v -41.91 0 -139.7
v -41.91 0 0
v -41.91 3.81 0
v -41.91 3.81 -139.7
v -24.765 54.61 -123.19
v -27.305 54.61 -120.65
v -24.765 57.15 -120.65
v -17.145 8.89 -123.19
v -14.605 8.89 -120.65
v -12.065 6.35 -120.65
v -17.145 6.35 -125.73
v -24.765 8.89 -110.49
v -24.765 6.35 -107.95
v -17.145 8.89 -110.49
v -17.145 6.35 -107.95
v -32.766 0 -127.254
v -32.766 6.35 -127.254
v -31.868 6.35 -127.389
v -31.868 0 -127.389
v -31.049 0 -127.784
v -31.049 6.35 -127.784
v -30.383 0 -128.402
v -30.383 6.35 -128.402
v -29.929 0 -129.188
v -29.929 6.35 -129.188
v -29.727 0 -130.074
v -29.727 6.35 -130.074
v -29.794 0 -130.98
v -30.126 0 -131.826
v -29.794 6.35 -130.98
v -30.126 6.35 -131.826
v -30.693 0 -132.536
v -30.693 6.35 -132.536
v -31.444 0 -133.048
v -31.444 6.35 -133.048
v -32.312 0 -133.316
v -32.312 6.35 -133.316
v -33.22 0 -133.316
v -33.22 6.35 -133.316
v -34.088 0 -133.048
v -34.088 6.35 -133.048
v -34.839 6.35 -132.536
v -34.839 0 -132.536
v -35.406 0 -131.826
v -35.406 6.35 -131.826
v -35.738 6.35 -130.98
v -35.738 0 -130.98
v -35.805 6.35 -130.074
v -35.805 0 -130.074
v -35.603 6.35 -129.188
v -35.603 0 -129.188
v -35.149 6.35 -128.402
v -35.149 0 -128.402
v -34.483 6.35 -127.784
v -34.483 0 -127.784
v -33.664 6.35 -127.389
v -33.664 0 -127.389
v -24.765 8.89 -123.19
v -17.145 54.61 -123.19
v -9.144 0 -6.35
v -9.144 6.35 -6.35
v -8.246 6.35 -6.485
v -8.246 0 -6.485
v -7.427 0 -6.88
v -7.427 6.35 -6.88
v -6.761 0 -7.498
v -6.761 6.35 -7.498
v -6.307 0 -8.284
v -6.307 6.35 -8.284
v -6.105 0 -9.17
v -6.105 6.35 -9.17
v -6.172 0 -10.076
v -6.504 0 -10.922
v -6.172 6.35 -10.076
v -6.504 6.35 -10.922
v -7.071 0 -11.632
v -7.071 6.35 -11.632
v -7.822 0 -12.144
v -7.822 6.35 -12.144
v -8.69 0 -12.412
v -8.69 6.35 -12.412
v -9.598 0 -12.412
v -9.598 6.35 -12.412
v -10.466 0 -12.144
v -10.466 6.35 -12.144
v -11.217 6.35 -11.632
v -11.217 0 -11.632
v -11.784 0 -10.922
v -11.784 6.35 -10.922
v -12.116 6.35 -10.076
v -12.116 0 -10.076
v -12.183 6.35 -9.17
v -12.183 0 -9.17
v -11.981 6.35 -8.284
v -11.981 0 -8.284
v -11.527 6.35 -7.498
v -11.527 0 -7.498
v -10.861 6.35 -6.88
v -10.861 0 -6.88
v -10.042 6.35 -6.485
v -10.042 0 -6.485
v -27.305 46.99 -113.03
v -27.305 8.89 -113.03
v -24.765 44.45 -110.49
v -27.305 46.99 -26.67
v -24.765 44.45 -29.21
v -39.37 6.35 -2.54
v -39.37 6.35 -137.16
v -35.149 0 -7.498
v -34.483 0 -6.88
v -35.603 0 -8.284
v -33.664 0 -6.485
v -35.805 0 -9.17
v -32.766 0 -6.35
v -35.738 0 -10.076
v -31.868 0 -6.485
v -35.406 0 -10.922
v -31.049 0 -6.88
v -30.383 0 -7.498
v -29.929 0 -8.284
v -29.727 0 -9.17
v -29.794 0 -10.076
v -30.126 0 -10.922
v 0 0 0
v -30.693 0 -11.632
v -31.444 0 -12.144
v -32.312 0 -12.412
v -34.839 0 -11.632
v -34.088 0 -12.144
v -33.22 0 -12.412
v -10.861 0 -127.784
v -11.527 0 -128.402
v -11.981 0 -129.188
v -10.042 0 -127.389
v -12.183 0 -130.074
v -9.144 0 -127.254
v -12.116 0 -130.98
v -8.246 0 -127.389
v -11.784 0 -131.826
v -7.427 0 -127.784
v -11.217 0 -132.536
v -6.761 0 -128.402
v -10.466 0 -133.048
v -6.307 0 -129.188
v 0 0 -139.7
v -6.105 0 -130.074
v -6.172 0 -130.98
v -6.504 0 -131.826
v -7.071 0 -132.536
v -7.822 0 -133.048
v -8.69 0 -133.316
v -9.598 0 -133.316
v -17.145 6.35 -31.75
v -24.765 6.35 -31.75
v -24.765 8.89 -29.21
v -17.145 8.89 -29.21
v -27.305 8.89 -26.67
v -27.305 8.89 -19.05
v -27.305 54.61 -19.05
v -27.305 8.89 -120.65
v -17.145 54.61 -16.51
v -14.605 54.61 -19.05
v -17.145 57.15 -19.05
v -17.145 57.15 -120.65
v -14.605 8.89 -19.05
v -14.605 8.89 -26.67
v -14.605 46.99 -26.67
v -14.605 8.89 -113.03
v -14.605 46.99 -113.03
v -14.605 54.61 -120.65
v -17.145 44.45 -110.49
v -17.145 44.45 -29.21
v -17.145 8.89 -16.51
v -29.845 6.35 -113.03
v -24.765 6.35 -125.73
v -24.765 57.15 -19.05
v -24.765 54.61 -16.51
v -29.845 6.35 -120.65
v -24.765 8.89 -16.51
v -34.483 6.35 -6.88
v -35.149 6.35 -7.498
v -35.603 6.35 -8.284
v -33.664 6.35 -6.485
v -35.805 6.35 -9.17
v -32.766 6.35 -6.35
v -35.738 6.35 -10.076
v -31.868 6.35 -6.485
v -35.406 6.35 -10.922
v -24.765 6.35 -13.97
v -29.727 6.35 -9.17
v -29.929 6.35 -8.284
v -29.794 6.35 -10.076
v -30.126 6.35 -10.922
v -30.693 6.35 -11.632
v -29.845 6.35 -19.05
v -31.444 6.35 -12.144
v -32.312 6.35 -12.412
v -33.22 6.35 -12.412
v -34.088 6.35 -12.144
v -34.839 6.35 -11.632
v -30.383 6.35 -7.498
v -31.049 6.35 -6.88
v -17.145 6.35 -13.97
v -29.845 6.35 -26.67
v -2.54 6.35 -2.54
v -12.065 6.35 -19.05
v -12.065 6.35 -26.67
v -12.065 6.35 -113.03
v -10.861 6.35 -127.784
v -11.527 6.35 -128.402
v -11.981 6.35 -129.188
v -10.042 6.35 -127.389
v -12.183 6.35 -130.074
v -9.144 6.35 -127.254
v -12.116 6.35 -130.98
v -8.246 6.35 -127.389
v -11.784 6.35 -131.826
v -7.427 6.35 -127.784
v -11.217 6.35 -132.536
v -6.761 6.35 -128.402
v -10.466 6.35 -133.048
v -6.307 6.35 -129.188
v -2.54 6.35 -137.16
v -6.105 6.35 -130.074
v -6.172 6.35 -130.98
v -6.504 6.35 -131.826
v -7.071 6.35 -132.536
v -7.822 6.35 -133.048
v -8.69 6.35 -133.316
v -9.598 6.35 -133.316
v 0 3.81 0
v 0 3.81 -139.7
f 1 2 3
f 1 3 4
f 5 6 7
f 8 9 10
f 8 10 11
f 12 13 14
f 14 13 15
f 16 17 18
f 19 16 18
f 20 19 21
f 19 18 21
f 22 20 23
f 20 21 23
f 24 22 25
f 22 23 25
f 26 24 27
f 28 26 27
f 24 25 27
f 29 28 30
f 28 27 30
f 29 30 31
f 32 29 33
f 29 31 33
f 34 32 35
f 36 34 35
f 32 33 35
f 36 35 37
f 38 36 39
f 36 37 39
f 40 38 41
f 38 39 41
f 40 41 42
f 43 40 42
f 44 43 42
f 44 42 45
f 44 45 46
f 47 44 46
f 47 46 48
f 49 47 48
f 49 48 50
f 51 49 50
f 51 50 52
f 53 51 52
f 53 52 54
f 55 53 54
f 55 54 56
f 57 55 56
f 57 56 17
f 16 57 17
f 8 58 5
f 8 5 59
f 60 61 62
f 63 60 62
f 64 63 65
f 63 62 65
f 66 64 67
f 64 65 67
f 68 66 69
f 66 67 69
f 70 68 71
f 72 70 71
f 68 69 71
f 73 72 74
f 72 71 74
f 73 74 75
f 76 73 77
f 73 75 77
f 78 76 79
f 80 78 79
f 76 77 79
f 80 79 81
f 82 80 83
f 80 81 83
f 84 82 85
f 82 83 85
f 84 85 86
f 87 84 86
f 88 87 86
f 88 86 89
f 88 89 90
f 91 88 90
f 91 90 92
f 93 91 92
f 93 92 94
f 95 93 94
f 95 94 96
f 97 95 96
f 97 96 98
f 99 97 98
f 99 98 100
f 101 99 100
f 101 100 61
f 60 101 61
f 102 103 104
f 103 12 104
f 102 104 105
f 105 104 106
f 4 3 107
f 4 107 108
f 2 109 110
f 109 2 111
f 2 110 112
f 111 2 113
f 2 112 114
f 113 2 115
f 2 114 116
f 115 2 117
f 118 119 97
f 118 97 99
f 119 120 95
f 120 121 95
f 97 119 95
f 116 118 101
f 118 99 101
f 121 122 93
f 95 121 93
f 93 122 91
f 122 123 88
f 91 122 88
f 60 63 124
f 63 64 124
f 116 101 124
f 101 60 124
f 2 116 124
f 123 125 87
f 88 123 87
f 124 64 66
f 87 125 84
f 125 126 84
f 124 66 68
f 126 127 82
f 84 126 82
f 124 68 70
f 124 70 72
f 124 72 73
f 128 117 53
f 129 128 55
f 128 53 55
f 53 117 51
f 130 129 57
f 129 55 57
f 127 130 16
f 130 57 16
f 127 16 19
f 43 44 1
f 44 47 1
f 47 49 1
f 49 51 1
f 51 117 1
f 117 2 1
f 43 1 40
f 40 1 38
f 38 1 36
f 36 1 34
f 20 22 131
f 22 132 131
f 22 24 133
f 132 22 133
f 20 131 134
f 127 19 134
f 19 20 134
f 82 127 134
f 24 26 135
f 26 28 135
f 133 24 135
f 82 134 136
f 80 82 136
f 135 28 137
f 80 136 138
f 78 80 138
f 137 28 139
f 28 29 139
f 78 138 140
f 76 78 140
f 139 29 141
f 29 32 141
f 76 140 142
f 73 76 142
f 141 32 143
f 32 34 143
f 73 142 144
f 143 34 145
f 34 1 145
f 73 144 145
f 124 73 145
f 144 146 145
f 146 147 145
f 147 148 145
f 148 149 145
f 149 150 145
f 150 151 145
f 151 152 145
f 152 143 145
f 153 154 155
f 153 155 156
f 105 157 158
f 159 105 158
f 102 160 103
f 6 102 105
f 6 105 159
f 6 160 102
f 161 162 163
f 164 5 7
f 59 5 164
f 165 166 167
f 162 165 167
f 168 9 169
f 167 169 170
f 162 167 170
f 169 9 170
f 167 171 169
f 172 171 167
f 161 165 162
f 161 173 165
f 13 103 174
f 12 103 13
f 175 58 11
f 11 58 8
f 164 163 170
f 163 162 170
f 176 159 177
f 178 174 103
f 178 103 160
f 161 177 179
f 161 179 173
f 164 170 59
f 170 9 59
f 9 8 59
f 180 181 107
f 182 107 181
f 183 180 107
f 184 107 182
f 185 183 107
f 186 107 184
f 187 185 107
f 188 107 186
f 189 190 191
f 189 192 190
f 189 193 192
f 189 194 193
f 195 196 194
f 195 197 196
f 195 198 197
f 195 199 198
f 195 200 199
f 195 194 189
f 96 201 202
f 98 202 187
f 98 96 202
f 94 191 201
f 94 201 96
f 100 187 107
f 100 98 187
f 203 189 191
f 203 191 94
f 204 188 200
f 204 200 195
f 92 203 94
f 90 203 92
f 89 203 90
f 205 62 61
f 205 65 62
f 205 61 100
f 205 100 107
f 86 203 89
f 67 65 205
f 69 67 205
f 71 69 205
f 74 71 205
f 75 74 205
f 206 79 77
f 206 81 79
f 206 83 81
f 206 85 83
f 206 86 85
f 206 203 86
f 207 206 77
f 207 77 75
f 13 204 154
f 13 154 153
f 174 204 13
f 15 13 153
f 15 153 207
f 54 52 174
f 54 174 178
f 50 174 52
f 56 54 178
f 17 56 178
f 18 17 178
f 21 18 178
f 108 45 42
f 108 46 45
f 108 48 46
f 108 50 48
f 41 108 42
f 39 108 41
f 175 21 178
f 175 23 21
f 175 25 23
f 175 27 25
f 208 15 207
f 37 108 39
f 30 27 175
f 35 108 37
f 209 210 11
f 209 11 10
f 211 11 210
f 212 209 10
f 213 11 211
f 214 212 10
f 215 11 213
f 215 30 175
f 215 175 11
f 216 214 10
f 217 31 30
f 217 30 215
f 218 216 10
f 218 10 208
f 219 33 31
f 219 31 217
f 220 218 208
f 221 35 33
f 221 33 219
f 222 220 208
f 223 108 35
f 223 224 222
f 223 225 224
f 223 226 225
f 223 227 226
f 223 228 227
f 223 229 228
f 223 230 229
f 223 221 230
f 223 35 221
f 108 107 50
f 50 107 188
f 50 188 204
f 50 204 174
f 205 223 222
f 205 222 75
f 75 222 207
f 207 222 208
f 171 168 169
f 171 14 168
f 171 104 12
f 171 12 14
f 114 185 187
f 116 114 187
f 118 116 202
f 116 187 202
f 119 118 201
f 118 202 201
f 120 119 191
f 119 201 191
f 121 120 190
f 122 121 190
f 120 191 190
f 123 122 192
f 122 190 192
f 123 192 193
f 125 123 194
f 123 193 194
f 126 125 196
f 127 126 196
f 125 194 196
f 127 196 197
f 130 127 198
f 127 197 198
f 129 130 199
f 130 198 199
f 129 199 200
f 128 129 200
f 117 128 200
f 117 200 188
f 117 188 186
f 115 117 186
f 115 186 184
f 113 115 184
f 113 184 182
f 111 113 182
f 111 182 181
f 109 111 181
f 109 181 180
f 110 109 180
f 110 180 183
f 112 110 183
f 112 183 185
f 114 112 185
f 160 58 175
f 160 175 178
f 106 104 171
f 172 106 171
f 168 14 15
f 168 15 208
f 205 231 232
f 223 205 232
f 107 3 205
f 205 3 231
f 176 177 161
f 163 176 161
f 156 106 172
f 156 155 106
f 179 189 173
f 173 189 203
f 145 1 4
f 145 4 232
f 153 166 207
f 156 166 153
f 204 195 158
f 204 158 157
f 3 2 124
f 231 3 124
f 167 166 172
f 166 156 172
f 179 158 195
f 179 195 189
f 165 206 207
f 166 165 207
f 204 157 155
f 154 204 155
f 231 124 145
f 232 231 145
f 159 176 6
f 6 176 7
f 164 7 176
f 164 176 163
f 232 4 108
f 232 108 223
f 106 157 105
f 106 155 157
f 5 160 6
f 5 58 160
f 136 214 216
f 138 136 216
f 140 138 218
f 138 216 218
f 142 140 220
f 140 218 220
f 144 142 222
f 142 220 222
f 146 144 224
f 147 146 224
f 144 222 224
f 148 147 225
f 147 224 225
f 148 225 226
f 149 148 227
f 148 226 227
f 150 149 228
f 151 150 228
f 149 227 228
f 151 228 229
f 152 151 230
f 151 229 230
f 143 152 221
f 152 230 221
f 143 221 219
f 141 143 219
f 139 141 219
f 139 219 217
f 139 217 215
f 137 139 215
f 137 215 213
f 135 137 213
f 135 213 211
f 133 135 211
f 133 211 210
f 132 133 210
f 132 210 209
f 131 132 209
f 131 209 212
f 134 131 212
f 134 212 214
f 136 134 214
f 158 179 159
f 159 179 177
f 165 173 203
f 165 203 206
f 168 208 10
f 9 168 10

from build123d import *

# Parameters (mm, degrees)
SKETCH1_W           = 41.91
SKETCH1_H           = 139.7
BOSS_EXTRUDE1_DEPTH = 6.35
SKETCH2_R           = 3.048
CUT_EXTRUDE1_DEPTH  = 146.989248234
SKETCH3_W           = 12.7
SKETCH3_H           = 12.7
BOSS_EXTRUDE2_DEPTH = 50.8
BOSS_EXTRUDE3_REACH = 133.265
SKETCH4_W           = 12.7
SKETCH4_H           = 12.7
CHAMFER1_SIZE       = 2.54


with BuildPart() as part:
    # Sketch1 → Boss-Extrude1 (new body)
    with BuildSketch(Plane(origin=(0, 0, 0), x_dir=(1, 0, 0), z_dir=(0, 1, 0))):
        with Locations((-20.955, 69.85)):
            Rectangle(SKETCH1_W, SKETCH1_H)
    extrude(amount=BOSS_EXTRUDE1_DEPTH)

    # Sketch2 → Cut-Extrude1 (cut, through all)
    with BuildSketch(Plane(origin=(0, 6.35, 0), x_dir=(1, 0, 0), z_dir=(0, 1, 0))):
        with Locations(Location((-32.766, 130.302, 0), (0, 0, 270))):
            Circle(SKETCH2_R)
        with Locations(Location((-9.144, 130.302, 0), (0, 0, 270))):
            Circle(SKETCH2_R)
        with Locations(Location((-9.144, 9.398, 0), (0, 0, 270))):
            Circle(SKETCH2_R)
        with Locations(Location((-32.766, 9.398, 0), (0, 0, 270))):
            Circle(SKETCH2_R)
    extrude(amount=-CUT_EXTRUDE1_DEPTH, mode=Mode.SUBTRACT)

    # Sketch3 → Boss-Extrude2 (add)
    with BuildSketch(Plane(origin=(0, 6.35, 0), x_dir=(1, 0, 0), z_dir=(0, 1, 0))):
        with Locations((-20.955, 116.84)):
            Rectangle(SKETCH3_W, SKETCH3_H)
        with Locations((-20.955, 22.86)):
            Rectangle(SKETCH3_W, SKETCH3_H)
    extrude(amount=BOSS_EXTRUDE2_DEPTH)

    # Sketch4 → Boss-Extrude3 (add, up to next)
    with BuildSketch(Plane.XY.offset(-110.49), mode=Mode.PRIVATE) as boss_extrude3_sk1:
        with Locations((-20.955, 50.8)):
            Rectangle(SKETCH4_W, SKETCH4_H)
    boss_extrude3_tool1 = extrude(boss_extrude3_sk1.sketch, amount=BOSS_EXTRUDE3_REACH, mode=Mode.PRIVATE) - part.part
    add(boss_extrude3_tool1.solids().sort_by_distance((-20.955, 50.8, -110.49))[0])

    # Chamfer1
    chamfer1_edges = [part.edges().sort_by_distance(p)[0] for p in [
        (-41.91, 6.35, -69.85),
        (-20.955, 6.35, 0),
        (-27.305, 6.35, -116.84),
        (-27.305, 31.75, -123.19),
        (-20.955, 6.35, -110.49),
        (-14.605, 6.35, -116.84),
        (-20.955, 6.35, -123.19),
        (-14.605, 31.75, -123.19),
        (-27.305, 57.15, -69.85),
        (-14.605, 57.15, -69.85),
        (-20.955, 57.15, -123.19),
        (-27.305, 6.35, -22.86),
        (-20.955, 6.35, -16.51),
        (-27.305, 31.75, -16.51),
        (-14.605, 6.35, -22.86),
        (-14.605, 31.75, -16.51),
        (-20.955, 6.35, -29.21),
        (-20.955, 57.15, -16.51),
        (0, 6.35, -69.85),
        (-14.605, 25.4, -29.21),
        (-14.605, 25.4, -110.49),
        (-27.305, 25.4, -110.49),
        (-27.305, 25.4, -29.21),
        (-27.305, 44.45, -69.85),
        (-14.605, 44.45, -69.85),
        (-20.955, 6.35, -139.7),
    ]]
    chamfer(chamfer1_edges, length=CHAMFER1_SIZE)


solid = part.part
